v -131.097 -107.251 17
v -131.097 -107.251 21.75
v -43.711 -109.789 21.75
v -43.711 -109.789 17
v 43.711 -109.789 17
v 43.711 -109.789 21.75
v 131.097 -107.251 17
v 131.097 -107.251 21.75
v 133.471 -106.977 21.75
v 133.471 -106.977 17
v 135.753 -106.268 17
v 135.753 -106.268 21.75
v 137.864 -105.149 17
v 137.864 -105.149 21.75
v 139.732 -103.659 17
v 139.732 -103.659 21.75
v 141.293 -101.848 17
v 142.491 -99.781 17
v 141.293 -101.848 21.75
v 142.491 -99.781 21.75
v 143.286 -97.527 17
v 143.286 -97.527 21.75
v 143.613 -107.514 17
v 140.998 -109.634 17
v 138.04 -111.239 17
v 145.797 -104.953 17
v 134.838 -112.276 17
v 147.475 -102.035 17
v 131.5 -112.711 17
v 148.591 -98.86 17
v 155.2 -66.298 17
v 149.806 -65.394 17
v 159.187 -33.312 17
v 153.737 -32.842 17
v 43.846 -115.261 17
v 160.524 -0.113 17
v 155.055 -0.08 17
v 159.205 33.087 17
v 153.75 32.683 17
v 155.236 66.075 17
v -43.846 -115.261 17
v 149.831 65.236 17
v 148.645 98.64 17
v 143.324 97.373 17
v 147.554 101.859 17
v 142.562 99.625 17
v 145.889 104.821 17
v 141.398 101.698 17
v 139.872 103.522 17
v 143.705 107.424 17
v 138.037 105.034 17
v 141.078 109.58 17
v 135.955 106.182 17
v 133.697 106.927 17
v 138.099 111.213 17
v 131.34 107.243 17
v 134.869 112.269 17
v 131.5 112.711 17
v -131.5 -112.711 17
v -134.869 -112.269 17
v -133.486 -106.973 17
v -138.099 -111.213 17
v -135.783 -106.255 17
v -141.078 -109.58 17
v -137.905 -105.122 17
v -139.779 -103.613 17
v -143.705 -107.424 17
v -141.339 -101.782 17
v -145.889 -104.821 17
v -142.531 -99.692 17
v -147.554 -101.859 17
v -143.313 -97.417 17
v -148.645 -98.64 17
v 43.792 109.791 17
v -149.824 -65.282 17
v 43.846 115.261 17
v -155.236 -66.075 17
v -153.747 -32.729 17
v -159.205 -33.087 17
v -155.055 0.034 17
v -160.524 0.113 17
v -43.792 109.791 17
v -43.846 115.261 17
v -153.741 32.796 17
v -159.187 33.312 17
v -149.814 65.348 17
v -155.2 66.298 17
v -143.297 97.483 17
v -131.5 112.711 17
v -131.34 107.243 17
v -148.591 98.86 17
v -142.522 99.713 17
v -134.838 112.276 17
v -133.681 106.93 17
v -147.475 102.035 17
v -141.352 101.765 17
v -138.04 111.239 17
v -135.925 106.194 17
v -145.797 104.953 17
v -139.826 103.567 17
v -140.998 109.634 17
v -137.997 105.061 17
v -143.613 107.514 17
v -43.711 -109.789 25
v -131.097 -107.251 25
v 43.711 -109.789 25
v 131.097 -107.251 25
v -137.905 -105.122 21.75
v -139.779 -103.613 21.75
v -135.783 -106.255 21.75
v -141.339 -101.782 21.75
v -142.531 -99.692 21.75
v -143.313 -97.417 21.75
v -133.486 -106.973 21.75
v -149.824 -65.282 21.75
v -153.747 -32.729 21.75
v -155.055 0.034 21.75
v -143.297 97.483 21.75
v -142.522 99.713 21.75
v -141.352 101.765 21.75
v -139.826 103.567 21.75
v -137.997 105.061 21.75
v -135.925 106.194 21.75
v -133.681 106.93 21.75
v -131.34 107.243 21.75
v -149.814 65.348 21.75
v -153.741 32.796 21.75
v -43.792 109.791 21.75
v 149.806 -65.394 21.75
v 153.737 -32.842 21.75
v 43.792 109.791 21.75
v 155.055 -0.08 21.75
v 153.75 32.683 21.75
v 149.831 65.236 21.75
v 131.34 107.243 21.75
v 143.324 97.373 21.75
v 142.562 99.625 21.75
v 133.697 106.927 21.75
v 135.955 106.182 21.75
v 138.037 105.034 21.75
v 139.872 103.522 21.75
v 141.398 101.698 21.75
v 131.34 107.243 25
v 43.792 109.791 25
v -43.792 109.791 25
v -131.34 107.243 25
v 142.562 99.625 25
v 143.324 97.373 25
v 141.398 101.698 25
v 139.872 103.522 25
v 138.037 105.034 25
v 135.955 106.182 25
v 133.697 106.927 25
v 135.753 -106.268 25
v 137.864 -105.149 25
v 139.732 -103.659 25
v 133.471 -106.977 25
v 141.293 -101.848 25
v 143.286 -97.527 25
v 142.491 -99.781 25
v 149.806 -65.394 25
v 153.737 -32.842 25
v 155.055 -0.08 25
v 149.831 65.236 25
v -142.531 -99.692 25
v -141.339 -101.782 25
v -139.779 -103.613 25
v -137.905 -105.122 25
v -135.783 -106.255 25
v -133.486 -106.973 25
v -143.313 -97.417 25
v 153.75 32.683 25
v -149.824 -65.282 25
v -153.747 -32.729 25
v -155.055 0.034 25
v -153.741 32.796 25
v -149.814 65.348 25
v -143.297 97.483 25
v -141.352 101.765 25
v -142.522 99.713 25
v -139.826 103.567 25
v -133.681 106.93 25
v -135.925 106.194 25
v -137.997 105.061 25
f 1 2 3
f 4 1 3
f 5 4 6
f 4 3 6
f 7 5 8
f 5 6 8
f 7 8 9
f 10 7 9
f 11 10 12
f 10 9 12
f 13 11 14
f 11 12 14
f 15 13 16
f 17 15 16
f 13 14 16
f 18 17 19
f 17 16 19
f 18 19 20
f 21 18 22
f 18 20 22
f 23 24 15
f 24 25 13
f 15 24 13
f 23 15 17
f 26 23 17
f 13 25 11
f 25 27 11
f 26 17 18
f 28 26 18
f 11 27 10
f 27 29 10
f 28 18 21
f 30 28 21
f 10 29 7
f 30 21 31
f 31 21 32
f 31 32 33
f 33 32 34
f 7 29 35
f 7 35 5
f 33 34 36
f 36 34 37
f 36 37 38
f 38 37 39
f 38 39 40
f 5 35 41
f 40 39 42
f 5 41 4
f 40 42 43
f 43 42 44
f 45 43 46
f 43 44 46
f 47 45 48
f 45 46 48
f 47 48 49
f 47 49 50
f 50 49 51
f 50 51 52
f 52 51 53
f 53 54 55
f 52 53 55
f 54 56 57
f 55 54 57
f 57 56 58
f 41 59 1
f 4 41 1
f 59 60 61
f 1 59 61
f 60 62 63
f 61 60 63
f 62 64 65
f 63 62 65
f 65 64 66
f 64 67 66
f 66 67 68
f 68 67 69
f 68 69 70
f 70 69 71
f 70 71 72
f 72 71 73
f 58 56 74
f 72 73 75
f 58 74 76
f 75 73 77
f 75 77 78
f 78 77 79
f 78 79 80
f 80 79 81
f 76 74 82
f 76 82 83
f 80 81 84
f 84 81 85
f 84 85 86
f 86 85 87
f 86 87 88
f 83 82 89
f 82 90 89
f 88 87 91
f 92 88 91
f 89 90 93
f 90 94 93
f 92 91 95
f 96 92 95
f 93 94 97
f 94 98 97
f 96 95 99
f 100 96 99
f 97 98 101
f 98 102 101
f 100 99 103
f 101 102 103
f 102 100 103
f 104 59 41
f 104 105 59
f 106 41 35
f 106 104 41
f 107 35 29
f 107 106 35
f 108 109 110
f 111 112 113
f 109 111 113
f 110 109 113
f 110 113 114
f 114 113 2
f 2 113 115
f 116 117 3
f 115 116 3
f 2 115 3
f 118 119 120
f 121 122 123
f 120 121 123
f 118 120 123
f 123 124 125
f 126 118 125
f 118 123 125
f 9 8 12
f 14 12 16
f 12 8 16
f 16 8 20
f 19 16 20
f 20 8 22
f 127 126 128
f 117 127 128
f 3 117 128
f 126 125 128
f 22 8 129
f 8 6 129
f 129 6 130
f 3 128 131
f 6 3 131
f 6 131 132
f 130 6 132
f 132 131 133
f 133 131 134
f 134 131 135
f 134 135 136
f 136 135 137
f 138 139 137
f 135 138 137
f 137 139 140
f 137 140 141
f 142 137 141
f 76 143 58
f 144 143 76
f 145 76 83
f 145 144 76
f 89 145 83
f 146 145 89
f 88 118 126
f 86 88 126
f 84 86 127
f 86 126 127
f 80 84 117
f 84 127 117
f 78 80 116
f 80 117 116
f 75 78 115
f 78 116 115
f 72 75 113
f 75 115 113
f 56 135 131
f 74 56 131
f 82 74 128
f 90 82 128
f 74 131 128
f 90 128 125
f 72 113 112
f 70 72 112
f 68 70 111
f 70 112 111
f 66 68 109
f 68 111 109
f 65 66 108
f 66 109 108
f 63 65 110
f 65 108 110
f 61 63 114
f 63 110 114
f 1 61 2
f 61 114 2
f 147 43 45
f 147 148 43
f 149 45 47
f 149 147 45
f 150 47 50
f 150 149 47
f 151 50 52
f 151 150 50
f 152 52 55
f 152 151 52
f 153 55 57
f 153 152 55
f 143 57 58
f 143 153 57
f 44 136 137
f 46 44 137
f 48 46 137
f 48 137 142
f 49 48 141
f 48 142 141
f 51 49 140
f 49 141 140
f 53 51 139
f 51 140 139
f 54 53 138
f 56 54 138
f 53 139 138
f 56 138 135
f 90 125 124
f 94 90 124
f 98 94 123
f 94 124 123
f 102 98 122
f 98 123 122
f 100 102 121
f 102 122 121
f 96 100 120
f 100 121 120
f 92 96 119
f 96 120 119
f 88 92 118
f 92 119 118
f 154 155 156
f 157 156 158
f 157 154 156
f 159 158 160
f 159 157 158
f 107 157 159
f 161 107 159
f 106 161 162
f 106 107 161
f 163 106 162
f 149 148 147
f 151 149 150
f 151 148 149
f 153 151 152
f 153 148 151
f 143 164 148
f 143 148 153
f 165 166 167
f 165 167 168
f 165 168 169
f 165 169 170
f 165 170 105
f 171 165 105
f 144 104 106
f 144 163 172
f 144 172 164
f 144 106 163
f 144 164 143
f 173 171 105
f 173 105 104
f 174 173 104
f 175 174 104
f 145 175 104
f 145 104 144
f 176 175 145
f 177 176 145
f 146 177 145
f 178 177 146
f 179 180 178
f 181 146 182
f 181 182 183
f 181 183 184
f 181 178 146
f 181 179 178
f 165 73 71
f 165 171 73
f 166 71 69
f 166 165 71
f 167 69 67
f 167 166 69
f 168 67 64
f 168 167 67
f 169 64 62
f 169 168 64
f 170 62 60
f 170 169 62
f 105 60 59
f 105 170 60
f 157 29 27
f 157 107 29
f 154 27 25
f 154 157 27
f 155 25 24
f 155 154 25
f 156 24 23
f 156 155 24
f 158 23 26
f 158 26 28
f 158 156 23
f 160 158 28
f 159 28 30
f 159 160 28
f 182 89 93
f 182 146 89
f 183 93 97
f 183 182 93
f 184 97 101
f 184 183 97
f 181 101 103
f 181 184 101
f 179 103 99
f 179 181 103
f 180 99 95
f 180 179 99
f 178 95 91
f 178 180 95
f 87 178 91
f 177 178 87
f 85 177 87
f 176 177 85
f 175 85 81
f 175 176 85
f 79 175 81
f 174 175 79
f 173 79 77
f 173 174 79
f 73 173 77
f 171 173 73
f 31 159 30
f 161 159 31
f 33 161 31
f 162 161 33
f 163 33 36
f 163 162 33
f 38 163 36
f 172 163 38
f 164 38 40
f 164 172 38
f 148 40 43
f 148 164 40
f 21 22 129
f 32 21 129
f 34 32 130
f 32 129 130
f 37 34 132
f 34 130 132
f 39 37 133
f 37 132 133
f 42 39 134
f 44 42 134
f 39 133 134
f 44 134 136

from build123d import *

# Parameters (mm, degrees)
PAD042_DEPTH = 4.75


with BuildPart() as case1:
    # Sketch042 → Pad042 (new body)
    with BuildSketch(Plane.XY.offset(21.75)):
        with BuildLine():
            ThreePointArc((131.340316, 107.243249), (0, 110.109105), (-131.340316, 107.243249))
            ThreePointArc((-131.340316, 107.243249), (-138.945789, 104.356177), (-143.297313, 97.482848))
            ThreePointArc((-143.297313, 97.482848), (-155.054952, 0.033785), (-143.313373, -97.417215))
            ThreePointArc((-143.313373, -97.417215), (-138.877345, -104.411658), (-131.096658, -107.250934))
            ThreePointArc((-131.096658, -107.250934), (0, -110.106161), (131.096658, -107.250934))
            ThreePointArc((131.096658, -107.250934), (138.833073, -104.447134), (143.286208, -97.52738))
            ThreePointArc((143.286208, -97.52738), (155.054743, -0.079681), (143.324086, 97.372584))
            ThreePointArc((143.324086, 97.372584), (138.989661, 104.320204), (131.340316, 107.243249))
        make_face()
    extrude(amount=-PAD042_DEPTH)


with BuildPart() as case_bottom_plane:
    # Sketch040 → Loft002 section 0
    with BuildSketch(Plane.XY.offset(17)):
        with BuildLine():
            ThreePointArc((131.5, 112.710757), (0, 115.580098), (-131.5, 112.710757))
            ThreePointArc((-131.5, 112.710757), (-142.354422, 108.63407), (-148.591078, 98.859511))
            ThreePointArc((-148.591078, 98.859511), (-160.524221, 0.112742), (-148.644672, -98.640489))
            ThreePointArc((-148.644672, -98.640489), (-142.441793, -108.562815), (-131.5, -112.710757))
            ThreePointArc((-131.5, -112.710757), (0, -115.580098), (131.5, -112.710757))
            ThreePointArc((131.5, -112.710757), (142.354422, -108.63407), (148.591078, -98.859511))
            ThreePointArc((148.591078, -98.859511), (160.524221, -0.112742), (148.644672, 98.640489))
            ThreePointArc((148.644672, 98.640489), (142.441793, 108.562815), (131.5, 112.710757))
        make_face()
    # Sketch041 → Loft002 section 1
    with BuildSketch(Plane.XY.offset(25)):
        with BuildLine():
            ThreePointArc((131.340316, 107.243249), (0, 110.109105), (-131.340316, 107.243249))
            ThreePointArc((-131.340316, 107.243249), (-138.945789, 104.356177), (-143.297313, 97.482848))
            ThreePointArc((-143.297313, 97.482848), (-155.054952, 0.033785), (-143.313373, -97.417215))
            ThreePointArc((-143.313373, -97.417215), (-138.877345, -104.411658), (-131.096658, -107.250934))
            ThreePointArc((-131.096658, -107.250934), (0, -110.106161), (131.096658, -107.250934))
            ThreePointArc((131.096658, -107.250934), (138.833073, -104.447134), (143.286208, -97.52738))
            ThreePointArc((143.286208, -97.52738), (155.054743, -0.079681), (143.324086, 97.372584))
            ThreePointArc((143.324086, 97.372584), (138.989661, 104.320204), (131.340316, 107.243249))
        make_face()
    loft()

    # Cut002: cut CASE1
    add(case1.part, mode=Mode.SUBTRACT)


solid = case_bottom_plane.part
